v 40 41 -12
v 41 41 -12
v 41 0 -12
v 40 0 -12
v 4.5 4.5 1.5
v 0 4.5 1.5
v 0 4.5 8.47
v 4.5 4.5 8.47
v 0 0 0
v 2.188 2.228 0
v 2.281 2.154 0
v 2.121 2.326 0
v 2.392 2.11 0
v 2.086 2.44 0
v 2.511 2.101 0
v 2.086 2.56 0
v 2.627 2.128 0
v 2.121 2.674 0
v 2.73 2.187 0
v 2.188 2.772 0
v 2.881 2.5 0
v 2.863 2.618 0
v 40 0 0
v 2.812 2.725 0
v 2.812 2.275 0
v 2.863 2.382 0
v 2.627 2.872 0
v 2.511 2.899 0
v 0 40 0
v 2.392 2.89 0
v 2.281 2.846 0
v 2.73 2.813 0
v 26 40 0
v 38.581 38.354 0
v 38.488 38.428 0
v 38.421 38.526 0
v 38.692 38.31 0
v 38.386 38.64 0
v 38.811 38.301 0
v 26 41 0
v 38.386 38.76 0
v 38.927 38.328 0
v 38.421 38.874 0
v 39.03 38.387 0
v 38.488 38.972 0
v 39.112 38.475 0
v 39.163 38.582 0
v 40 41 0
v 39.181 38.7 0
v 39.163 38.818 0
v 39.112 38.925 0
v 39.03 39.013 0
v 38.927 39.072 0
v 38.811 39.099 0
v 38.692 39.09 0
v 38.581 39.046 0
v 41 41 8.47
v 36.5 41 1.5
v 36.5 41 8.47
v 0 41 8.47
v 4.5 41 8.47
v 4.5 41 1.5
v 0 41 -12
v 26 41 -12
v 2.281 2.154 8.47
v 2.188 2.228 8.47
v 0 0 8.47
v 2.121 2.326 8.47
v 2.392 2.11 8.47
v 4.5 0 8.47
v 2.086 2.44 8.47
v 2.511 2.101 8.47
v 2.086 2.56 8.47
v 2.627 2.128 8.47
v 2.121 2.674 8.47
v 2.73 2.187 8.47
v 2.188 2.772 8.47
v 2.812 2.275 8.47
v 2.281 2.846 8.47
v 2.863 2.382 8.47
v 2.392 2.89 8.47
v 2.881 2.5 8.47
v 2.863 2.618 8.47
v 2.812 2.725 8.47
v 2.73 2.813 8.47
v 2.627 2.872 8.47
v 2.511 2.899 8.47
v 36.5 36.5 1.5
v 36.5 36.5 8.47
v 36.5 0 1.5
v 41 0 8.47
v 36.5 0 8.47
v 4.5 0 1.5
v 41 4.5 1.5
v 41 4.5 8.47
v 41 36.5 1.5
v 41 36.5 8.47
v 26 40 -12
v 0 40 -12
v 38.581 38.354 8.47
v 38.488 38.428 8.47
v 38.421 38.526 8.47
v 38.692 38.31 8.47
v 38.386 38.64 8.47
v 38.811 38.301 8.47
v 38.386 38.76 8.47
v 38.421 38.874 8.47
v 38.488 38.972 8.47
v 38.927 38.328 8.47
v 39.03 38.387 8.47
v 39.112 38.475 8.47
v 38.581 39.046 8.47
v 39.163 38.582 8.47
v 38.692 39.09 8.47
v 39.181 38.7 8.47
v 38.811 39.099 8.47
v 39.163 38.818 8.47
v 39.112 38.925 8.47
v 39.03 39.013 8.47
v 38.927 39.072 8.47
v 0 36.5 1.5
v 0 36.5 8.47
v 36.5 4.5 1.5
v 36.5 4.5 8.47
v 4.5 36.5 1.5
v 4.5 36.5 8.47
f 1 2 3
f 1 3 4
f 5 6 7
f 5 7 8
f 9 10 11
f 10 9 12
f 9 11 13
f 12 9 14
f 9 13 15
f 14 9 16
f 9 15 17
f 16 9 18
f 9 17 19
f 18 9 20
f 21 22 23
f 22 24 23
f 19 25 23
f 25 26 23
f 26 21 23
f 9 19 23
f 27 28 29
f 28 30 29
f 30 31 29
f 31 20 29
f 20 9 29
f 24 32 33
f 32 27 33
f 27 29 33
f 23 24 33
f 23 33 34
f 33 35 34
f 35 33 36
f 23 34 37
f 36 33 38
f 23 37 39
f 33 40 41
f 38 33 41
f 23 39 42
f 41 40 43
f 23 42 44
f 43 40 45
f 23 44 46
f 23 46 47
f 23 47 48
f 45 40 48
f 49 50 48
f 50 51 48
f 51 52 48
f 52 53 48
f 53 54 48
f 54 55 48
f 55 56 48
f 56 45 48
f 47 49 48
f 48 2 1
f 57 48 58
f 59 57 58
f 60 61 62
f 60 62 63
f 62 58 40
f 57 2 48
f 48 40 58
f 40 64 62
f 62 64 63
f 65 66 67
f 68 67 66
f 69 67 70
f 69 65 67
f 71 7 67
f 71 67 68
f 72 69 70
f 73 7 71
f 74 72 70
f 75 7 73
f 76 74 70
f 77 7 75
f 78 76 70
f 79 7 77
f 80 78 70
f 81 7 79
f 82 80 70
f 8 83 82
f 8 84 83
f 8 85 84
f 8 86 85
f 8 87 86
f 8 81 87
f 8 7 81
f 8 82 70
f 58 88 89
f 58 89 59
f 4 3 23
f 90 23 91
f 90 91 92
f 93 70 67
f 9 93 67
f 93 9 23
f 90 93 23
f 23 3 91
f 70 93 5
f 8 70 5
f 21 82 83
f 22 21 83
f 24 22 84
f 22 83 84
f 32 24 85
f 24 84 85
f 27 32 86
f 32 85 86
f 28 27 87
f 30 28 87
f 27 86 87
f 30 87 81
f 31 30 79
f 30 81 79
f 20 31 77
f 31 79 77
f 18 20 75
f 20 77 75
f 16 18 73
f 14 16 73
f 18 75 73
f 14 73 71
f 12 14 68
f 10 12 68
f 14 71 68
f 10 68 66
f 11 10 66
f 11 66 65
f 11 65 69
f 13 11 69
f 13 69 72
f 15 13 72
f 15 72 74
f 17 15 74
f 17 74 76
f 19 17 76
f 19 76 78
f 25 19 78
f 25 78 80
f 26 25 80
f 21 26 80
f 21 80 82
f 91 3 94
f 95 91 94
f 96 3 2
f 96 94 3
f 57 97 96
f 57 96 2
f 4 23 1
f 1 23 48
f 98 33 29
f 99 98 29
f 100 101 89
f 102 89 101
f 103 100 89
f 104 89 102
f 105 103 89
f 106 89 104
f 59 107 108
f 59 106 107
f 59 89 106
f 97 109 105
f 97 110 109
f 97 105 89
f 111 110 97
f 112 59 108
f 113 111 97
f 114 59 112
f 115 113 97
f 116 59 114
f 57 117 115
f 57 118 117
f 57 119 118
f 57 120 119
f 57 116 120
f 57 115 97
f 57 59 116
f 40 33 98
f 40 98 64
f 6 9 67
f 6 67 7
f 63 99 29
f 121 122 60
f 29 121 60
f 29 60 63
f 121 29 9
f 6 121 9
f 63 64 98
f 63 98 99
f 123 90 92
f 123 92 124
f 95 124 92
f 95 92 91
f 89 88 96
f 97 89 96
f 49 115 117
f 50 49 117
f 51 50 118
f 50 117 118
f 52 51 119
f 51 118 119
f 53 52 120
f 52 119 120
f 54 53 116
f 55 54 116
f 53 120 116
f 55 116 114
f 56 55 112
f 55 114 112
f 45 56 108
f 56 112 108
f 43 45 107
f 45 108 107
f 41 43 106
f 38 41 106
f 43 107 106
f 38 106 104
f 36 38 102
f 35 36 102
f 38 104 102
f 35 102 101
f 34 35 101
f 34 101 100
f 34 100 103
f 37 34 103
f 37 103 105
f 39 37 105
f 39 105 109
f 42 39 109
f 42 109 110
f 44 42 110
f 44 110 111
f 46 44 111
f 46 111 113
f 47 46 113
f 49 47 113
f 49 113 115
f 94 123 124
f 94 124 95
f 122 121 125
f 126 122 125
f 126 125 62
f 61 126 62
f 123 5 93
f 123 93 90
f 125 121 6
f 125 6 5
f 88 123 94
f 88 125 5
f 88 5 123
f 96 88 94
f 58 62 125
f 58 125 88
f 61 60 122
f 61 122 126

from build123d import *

# Parameters (mm, degrees)
SCHIZZO1_W                   = 41
SCHIZZO1_H                   = 41
ESTRUSIONE_ESTRUSIONE1_DEPTH = 1.5
SCHIZZO5_W                   = 4.5
SCHIZZO5_H                   = 4.5
ESTRUSIONE_ESTRUSIONE2_DEPTH = 6.97
SCHIZZO6_W                   = 4.5
SCHIZZO6_H                   = 4.5
ESTRUSIONE_ESTRUSIONE3_DEPTH = 6.97
SCHIZZO7_W                   = 4.5
SCHIZZO7_H                   = 4.5
ESTRUSIONE_ESTRUSIONE4_DEPTH = 6.97
SCHIZZO8_W                   = 4.5
SCHIZZO8_H                   = 4.5
ESTRUSIONE_ESTRUSIONE5_DEPTH = 6.97
SCHIZZO9_W                   = 1
SCHIZZO9_H                   = 41
ESTRUSIONE_ESTRUSIONE6_DEPTH = 12
SCHIZZO10_W                  = 26
SCHIZZO10_H                  = 1
ESTRUSIONE_ESTRUSIONE7_DEPTH = 12
SCHIZZO11_R                  = 0.4
TAGLIO_ESTRUSIONE1_DEPTH     = 10
SCHIZZO12_R                  = 0.4
TAGLIO_ESTRUSIONE2_DEPTH     = 10


with BuildPart() as part:
    # Schizzo1 → Estrusione-Estrusione1 (new body)
    with BuildSketch(Plane.XY):
        with Locations((20.5, 20.5)):
            Rectangle(SCHIZZO1_W, SCHIZZO1_H)
    extrude(amount=ESTRUSIONE_ESTRUSIONE1_DEPTH)

    # Schizzo5 → Estrusione-Estrusione2 (add)
    with BuildSketch(Plane.XY.offset(1.5)):
        with Locations((2.25, 2.25)):
            Rectangle(SCHIZZO5_W, SCHIZZO5_H)
    extrude(amount=ESTRUSIONE_ESTRUSIONE2_DEPTH)

    # Schizzo6 → Estrusione-Estrusione3 (add)
    with BuildSketch(Plane.XY.offset(1.5)):
        with Locations((38.75, 2.25)):
            Rectangle(SCHIZZO6_W, SCHIZZO6_H)
    extrude(amount=ESTRUSIONE_ESTRUSIONE3_DEPTH)

    # Schizzo7 → Estrusione-Estrusione4 (add)
    with BuildSketch(Plane.XY.offset(1.5)):
        with Locations((2.25, 38.75)):
            Rectangle(SCHIZZO7_W, SCHIZZO7_H)
    extrude(amount=ESTRUSIONE_ESTRUSIONE4_DEPTH)

    # Schizzo8 → Estrusione-Estrusione5 (add)
    with BuildSketch(Plane.XY.offset(1.5)):
        with Locations((38.75, 38.75)):
            Rectangle(SCHIZZO8_W, SCHIZZO8_H)
    extrude(amount=ESTRUSIONE_ESTRUSIONE5_DEPTH)

    # Schizzo9 → Estrusione-Estrusione6 (add)
    with BuildSketch(Plane(origin=(0, 0, 0), x_dir=(-1, 0, 0), z_dir=(0, 0, -1))):
        with Locations((-40.5, 20.5)):
            Rectangle(SCHIZZO9_W, SCHIZZO9_H)
    extrude(amount=ESTRUSIONE_ESTRUSIONE6_DEPTH)

    # Schizzo10 → Estrusione-Estrusione7 (add)
    with BuildSketch(Plane(origin=(0, 0, 0), x_dir=(-1, 0, 0), z_dir=(0, 0, -1))):
        with Locations((-13, 40.5)):
            Rectangle(SCHIZZO10_W, SCHIZZO10_H)
    extrude(amount=ESTRUSIONE_ESTRUSIONE7_DEPTH)

    # Schizzo11 → Taglio-Estrusione1 (cut)
    with BuildSketch(Plane.XY.offset(8.47)):
        with Locations((38.781075858, 38.7)):
            Circle(SCHIZZO11_R)
    extrude(amount=-TAGLIO_ESTRUSIONE1_DEPTH, mode=Mode.SUBTRACT)

    # Schizzo12 → Taglio-Estrusione2 (cut)
    with BuildSketch(Plane.XY.offset(8.47)):
        with Locations((2.481075858, 2.5)):
            Circle(SCHIZZO12_R)
    extrude(amount=-TAGLIO_ESTRUSIONE2_DEPTH, mode=Mode.SUBTRACT)


solid = part.part
